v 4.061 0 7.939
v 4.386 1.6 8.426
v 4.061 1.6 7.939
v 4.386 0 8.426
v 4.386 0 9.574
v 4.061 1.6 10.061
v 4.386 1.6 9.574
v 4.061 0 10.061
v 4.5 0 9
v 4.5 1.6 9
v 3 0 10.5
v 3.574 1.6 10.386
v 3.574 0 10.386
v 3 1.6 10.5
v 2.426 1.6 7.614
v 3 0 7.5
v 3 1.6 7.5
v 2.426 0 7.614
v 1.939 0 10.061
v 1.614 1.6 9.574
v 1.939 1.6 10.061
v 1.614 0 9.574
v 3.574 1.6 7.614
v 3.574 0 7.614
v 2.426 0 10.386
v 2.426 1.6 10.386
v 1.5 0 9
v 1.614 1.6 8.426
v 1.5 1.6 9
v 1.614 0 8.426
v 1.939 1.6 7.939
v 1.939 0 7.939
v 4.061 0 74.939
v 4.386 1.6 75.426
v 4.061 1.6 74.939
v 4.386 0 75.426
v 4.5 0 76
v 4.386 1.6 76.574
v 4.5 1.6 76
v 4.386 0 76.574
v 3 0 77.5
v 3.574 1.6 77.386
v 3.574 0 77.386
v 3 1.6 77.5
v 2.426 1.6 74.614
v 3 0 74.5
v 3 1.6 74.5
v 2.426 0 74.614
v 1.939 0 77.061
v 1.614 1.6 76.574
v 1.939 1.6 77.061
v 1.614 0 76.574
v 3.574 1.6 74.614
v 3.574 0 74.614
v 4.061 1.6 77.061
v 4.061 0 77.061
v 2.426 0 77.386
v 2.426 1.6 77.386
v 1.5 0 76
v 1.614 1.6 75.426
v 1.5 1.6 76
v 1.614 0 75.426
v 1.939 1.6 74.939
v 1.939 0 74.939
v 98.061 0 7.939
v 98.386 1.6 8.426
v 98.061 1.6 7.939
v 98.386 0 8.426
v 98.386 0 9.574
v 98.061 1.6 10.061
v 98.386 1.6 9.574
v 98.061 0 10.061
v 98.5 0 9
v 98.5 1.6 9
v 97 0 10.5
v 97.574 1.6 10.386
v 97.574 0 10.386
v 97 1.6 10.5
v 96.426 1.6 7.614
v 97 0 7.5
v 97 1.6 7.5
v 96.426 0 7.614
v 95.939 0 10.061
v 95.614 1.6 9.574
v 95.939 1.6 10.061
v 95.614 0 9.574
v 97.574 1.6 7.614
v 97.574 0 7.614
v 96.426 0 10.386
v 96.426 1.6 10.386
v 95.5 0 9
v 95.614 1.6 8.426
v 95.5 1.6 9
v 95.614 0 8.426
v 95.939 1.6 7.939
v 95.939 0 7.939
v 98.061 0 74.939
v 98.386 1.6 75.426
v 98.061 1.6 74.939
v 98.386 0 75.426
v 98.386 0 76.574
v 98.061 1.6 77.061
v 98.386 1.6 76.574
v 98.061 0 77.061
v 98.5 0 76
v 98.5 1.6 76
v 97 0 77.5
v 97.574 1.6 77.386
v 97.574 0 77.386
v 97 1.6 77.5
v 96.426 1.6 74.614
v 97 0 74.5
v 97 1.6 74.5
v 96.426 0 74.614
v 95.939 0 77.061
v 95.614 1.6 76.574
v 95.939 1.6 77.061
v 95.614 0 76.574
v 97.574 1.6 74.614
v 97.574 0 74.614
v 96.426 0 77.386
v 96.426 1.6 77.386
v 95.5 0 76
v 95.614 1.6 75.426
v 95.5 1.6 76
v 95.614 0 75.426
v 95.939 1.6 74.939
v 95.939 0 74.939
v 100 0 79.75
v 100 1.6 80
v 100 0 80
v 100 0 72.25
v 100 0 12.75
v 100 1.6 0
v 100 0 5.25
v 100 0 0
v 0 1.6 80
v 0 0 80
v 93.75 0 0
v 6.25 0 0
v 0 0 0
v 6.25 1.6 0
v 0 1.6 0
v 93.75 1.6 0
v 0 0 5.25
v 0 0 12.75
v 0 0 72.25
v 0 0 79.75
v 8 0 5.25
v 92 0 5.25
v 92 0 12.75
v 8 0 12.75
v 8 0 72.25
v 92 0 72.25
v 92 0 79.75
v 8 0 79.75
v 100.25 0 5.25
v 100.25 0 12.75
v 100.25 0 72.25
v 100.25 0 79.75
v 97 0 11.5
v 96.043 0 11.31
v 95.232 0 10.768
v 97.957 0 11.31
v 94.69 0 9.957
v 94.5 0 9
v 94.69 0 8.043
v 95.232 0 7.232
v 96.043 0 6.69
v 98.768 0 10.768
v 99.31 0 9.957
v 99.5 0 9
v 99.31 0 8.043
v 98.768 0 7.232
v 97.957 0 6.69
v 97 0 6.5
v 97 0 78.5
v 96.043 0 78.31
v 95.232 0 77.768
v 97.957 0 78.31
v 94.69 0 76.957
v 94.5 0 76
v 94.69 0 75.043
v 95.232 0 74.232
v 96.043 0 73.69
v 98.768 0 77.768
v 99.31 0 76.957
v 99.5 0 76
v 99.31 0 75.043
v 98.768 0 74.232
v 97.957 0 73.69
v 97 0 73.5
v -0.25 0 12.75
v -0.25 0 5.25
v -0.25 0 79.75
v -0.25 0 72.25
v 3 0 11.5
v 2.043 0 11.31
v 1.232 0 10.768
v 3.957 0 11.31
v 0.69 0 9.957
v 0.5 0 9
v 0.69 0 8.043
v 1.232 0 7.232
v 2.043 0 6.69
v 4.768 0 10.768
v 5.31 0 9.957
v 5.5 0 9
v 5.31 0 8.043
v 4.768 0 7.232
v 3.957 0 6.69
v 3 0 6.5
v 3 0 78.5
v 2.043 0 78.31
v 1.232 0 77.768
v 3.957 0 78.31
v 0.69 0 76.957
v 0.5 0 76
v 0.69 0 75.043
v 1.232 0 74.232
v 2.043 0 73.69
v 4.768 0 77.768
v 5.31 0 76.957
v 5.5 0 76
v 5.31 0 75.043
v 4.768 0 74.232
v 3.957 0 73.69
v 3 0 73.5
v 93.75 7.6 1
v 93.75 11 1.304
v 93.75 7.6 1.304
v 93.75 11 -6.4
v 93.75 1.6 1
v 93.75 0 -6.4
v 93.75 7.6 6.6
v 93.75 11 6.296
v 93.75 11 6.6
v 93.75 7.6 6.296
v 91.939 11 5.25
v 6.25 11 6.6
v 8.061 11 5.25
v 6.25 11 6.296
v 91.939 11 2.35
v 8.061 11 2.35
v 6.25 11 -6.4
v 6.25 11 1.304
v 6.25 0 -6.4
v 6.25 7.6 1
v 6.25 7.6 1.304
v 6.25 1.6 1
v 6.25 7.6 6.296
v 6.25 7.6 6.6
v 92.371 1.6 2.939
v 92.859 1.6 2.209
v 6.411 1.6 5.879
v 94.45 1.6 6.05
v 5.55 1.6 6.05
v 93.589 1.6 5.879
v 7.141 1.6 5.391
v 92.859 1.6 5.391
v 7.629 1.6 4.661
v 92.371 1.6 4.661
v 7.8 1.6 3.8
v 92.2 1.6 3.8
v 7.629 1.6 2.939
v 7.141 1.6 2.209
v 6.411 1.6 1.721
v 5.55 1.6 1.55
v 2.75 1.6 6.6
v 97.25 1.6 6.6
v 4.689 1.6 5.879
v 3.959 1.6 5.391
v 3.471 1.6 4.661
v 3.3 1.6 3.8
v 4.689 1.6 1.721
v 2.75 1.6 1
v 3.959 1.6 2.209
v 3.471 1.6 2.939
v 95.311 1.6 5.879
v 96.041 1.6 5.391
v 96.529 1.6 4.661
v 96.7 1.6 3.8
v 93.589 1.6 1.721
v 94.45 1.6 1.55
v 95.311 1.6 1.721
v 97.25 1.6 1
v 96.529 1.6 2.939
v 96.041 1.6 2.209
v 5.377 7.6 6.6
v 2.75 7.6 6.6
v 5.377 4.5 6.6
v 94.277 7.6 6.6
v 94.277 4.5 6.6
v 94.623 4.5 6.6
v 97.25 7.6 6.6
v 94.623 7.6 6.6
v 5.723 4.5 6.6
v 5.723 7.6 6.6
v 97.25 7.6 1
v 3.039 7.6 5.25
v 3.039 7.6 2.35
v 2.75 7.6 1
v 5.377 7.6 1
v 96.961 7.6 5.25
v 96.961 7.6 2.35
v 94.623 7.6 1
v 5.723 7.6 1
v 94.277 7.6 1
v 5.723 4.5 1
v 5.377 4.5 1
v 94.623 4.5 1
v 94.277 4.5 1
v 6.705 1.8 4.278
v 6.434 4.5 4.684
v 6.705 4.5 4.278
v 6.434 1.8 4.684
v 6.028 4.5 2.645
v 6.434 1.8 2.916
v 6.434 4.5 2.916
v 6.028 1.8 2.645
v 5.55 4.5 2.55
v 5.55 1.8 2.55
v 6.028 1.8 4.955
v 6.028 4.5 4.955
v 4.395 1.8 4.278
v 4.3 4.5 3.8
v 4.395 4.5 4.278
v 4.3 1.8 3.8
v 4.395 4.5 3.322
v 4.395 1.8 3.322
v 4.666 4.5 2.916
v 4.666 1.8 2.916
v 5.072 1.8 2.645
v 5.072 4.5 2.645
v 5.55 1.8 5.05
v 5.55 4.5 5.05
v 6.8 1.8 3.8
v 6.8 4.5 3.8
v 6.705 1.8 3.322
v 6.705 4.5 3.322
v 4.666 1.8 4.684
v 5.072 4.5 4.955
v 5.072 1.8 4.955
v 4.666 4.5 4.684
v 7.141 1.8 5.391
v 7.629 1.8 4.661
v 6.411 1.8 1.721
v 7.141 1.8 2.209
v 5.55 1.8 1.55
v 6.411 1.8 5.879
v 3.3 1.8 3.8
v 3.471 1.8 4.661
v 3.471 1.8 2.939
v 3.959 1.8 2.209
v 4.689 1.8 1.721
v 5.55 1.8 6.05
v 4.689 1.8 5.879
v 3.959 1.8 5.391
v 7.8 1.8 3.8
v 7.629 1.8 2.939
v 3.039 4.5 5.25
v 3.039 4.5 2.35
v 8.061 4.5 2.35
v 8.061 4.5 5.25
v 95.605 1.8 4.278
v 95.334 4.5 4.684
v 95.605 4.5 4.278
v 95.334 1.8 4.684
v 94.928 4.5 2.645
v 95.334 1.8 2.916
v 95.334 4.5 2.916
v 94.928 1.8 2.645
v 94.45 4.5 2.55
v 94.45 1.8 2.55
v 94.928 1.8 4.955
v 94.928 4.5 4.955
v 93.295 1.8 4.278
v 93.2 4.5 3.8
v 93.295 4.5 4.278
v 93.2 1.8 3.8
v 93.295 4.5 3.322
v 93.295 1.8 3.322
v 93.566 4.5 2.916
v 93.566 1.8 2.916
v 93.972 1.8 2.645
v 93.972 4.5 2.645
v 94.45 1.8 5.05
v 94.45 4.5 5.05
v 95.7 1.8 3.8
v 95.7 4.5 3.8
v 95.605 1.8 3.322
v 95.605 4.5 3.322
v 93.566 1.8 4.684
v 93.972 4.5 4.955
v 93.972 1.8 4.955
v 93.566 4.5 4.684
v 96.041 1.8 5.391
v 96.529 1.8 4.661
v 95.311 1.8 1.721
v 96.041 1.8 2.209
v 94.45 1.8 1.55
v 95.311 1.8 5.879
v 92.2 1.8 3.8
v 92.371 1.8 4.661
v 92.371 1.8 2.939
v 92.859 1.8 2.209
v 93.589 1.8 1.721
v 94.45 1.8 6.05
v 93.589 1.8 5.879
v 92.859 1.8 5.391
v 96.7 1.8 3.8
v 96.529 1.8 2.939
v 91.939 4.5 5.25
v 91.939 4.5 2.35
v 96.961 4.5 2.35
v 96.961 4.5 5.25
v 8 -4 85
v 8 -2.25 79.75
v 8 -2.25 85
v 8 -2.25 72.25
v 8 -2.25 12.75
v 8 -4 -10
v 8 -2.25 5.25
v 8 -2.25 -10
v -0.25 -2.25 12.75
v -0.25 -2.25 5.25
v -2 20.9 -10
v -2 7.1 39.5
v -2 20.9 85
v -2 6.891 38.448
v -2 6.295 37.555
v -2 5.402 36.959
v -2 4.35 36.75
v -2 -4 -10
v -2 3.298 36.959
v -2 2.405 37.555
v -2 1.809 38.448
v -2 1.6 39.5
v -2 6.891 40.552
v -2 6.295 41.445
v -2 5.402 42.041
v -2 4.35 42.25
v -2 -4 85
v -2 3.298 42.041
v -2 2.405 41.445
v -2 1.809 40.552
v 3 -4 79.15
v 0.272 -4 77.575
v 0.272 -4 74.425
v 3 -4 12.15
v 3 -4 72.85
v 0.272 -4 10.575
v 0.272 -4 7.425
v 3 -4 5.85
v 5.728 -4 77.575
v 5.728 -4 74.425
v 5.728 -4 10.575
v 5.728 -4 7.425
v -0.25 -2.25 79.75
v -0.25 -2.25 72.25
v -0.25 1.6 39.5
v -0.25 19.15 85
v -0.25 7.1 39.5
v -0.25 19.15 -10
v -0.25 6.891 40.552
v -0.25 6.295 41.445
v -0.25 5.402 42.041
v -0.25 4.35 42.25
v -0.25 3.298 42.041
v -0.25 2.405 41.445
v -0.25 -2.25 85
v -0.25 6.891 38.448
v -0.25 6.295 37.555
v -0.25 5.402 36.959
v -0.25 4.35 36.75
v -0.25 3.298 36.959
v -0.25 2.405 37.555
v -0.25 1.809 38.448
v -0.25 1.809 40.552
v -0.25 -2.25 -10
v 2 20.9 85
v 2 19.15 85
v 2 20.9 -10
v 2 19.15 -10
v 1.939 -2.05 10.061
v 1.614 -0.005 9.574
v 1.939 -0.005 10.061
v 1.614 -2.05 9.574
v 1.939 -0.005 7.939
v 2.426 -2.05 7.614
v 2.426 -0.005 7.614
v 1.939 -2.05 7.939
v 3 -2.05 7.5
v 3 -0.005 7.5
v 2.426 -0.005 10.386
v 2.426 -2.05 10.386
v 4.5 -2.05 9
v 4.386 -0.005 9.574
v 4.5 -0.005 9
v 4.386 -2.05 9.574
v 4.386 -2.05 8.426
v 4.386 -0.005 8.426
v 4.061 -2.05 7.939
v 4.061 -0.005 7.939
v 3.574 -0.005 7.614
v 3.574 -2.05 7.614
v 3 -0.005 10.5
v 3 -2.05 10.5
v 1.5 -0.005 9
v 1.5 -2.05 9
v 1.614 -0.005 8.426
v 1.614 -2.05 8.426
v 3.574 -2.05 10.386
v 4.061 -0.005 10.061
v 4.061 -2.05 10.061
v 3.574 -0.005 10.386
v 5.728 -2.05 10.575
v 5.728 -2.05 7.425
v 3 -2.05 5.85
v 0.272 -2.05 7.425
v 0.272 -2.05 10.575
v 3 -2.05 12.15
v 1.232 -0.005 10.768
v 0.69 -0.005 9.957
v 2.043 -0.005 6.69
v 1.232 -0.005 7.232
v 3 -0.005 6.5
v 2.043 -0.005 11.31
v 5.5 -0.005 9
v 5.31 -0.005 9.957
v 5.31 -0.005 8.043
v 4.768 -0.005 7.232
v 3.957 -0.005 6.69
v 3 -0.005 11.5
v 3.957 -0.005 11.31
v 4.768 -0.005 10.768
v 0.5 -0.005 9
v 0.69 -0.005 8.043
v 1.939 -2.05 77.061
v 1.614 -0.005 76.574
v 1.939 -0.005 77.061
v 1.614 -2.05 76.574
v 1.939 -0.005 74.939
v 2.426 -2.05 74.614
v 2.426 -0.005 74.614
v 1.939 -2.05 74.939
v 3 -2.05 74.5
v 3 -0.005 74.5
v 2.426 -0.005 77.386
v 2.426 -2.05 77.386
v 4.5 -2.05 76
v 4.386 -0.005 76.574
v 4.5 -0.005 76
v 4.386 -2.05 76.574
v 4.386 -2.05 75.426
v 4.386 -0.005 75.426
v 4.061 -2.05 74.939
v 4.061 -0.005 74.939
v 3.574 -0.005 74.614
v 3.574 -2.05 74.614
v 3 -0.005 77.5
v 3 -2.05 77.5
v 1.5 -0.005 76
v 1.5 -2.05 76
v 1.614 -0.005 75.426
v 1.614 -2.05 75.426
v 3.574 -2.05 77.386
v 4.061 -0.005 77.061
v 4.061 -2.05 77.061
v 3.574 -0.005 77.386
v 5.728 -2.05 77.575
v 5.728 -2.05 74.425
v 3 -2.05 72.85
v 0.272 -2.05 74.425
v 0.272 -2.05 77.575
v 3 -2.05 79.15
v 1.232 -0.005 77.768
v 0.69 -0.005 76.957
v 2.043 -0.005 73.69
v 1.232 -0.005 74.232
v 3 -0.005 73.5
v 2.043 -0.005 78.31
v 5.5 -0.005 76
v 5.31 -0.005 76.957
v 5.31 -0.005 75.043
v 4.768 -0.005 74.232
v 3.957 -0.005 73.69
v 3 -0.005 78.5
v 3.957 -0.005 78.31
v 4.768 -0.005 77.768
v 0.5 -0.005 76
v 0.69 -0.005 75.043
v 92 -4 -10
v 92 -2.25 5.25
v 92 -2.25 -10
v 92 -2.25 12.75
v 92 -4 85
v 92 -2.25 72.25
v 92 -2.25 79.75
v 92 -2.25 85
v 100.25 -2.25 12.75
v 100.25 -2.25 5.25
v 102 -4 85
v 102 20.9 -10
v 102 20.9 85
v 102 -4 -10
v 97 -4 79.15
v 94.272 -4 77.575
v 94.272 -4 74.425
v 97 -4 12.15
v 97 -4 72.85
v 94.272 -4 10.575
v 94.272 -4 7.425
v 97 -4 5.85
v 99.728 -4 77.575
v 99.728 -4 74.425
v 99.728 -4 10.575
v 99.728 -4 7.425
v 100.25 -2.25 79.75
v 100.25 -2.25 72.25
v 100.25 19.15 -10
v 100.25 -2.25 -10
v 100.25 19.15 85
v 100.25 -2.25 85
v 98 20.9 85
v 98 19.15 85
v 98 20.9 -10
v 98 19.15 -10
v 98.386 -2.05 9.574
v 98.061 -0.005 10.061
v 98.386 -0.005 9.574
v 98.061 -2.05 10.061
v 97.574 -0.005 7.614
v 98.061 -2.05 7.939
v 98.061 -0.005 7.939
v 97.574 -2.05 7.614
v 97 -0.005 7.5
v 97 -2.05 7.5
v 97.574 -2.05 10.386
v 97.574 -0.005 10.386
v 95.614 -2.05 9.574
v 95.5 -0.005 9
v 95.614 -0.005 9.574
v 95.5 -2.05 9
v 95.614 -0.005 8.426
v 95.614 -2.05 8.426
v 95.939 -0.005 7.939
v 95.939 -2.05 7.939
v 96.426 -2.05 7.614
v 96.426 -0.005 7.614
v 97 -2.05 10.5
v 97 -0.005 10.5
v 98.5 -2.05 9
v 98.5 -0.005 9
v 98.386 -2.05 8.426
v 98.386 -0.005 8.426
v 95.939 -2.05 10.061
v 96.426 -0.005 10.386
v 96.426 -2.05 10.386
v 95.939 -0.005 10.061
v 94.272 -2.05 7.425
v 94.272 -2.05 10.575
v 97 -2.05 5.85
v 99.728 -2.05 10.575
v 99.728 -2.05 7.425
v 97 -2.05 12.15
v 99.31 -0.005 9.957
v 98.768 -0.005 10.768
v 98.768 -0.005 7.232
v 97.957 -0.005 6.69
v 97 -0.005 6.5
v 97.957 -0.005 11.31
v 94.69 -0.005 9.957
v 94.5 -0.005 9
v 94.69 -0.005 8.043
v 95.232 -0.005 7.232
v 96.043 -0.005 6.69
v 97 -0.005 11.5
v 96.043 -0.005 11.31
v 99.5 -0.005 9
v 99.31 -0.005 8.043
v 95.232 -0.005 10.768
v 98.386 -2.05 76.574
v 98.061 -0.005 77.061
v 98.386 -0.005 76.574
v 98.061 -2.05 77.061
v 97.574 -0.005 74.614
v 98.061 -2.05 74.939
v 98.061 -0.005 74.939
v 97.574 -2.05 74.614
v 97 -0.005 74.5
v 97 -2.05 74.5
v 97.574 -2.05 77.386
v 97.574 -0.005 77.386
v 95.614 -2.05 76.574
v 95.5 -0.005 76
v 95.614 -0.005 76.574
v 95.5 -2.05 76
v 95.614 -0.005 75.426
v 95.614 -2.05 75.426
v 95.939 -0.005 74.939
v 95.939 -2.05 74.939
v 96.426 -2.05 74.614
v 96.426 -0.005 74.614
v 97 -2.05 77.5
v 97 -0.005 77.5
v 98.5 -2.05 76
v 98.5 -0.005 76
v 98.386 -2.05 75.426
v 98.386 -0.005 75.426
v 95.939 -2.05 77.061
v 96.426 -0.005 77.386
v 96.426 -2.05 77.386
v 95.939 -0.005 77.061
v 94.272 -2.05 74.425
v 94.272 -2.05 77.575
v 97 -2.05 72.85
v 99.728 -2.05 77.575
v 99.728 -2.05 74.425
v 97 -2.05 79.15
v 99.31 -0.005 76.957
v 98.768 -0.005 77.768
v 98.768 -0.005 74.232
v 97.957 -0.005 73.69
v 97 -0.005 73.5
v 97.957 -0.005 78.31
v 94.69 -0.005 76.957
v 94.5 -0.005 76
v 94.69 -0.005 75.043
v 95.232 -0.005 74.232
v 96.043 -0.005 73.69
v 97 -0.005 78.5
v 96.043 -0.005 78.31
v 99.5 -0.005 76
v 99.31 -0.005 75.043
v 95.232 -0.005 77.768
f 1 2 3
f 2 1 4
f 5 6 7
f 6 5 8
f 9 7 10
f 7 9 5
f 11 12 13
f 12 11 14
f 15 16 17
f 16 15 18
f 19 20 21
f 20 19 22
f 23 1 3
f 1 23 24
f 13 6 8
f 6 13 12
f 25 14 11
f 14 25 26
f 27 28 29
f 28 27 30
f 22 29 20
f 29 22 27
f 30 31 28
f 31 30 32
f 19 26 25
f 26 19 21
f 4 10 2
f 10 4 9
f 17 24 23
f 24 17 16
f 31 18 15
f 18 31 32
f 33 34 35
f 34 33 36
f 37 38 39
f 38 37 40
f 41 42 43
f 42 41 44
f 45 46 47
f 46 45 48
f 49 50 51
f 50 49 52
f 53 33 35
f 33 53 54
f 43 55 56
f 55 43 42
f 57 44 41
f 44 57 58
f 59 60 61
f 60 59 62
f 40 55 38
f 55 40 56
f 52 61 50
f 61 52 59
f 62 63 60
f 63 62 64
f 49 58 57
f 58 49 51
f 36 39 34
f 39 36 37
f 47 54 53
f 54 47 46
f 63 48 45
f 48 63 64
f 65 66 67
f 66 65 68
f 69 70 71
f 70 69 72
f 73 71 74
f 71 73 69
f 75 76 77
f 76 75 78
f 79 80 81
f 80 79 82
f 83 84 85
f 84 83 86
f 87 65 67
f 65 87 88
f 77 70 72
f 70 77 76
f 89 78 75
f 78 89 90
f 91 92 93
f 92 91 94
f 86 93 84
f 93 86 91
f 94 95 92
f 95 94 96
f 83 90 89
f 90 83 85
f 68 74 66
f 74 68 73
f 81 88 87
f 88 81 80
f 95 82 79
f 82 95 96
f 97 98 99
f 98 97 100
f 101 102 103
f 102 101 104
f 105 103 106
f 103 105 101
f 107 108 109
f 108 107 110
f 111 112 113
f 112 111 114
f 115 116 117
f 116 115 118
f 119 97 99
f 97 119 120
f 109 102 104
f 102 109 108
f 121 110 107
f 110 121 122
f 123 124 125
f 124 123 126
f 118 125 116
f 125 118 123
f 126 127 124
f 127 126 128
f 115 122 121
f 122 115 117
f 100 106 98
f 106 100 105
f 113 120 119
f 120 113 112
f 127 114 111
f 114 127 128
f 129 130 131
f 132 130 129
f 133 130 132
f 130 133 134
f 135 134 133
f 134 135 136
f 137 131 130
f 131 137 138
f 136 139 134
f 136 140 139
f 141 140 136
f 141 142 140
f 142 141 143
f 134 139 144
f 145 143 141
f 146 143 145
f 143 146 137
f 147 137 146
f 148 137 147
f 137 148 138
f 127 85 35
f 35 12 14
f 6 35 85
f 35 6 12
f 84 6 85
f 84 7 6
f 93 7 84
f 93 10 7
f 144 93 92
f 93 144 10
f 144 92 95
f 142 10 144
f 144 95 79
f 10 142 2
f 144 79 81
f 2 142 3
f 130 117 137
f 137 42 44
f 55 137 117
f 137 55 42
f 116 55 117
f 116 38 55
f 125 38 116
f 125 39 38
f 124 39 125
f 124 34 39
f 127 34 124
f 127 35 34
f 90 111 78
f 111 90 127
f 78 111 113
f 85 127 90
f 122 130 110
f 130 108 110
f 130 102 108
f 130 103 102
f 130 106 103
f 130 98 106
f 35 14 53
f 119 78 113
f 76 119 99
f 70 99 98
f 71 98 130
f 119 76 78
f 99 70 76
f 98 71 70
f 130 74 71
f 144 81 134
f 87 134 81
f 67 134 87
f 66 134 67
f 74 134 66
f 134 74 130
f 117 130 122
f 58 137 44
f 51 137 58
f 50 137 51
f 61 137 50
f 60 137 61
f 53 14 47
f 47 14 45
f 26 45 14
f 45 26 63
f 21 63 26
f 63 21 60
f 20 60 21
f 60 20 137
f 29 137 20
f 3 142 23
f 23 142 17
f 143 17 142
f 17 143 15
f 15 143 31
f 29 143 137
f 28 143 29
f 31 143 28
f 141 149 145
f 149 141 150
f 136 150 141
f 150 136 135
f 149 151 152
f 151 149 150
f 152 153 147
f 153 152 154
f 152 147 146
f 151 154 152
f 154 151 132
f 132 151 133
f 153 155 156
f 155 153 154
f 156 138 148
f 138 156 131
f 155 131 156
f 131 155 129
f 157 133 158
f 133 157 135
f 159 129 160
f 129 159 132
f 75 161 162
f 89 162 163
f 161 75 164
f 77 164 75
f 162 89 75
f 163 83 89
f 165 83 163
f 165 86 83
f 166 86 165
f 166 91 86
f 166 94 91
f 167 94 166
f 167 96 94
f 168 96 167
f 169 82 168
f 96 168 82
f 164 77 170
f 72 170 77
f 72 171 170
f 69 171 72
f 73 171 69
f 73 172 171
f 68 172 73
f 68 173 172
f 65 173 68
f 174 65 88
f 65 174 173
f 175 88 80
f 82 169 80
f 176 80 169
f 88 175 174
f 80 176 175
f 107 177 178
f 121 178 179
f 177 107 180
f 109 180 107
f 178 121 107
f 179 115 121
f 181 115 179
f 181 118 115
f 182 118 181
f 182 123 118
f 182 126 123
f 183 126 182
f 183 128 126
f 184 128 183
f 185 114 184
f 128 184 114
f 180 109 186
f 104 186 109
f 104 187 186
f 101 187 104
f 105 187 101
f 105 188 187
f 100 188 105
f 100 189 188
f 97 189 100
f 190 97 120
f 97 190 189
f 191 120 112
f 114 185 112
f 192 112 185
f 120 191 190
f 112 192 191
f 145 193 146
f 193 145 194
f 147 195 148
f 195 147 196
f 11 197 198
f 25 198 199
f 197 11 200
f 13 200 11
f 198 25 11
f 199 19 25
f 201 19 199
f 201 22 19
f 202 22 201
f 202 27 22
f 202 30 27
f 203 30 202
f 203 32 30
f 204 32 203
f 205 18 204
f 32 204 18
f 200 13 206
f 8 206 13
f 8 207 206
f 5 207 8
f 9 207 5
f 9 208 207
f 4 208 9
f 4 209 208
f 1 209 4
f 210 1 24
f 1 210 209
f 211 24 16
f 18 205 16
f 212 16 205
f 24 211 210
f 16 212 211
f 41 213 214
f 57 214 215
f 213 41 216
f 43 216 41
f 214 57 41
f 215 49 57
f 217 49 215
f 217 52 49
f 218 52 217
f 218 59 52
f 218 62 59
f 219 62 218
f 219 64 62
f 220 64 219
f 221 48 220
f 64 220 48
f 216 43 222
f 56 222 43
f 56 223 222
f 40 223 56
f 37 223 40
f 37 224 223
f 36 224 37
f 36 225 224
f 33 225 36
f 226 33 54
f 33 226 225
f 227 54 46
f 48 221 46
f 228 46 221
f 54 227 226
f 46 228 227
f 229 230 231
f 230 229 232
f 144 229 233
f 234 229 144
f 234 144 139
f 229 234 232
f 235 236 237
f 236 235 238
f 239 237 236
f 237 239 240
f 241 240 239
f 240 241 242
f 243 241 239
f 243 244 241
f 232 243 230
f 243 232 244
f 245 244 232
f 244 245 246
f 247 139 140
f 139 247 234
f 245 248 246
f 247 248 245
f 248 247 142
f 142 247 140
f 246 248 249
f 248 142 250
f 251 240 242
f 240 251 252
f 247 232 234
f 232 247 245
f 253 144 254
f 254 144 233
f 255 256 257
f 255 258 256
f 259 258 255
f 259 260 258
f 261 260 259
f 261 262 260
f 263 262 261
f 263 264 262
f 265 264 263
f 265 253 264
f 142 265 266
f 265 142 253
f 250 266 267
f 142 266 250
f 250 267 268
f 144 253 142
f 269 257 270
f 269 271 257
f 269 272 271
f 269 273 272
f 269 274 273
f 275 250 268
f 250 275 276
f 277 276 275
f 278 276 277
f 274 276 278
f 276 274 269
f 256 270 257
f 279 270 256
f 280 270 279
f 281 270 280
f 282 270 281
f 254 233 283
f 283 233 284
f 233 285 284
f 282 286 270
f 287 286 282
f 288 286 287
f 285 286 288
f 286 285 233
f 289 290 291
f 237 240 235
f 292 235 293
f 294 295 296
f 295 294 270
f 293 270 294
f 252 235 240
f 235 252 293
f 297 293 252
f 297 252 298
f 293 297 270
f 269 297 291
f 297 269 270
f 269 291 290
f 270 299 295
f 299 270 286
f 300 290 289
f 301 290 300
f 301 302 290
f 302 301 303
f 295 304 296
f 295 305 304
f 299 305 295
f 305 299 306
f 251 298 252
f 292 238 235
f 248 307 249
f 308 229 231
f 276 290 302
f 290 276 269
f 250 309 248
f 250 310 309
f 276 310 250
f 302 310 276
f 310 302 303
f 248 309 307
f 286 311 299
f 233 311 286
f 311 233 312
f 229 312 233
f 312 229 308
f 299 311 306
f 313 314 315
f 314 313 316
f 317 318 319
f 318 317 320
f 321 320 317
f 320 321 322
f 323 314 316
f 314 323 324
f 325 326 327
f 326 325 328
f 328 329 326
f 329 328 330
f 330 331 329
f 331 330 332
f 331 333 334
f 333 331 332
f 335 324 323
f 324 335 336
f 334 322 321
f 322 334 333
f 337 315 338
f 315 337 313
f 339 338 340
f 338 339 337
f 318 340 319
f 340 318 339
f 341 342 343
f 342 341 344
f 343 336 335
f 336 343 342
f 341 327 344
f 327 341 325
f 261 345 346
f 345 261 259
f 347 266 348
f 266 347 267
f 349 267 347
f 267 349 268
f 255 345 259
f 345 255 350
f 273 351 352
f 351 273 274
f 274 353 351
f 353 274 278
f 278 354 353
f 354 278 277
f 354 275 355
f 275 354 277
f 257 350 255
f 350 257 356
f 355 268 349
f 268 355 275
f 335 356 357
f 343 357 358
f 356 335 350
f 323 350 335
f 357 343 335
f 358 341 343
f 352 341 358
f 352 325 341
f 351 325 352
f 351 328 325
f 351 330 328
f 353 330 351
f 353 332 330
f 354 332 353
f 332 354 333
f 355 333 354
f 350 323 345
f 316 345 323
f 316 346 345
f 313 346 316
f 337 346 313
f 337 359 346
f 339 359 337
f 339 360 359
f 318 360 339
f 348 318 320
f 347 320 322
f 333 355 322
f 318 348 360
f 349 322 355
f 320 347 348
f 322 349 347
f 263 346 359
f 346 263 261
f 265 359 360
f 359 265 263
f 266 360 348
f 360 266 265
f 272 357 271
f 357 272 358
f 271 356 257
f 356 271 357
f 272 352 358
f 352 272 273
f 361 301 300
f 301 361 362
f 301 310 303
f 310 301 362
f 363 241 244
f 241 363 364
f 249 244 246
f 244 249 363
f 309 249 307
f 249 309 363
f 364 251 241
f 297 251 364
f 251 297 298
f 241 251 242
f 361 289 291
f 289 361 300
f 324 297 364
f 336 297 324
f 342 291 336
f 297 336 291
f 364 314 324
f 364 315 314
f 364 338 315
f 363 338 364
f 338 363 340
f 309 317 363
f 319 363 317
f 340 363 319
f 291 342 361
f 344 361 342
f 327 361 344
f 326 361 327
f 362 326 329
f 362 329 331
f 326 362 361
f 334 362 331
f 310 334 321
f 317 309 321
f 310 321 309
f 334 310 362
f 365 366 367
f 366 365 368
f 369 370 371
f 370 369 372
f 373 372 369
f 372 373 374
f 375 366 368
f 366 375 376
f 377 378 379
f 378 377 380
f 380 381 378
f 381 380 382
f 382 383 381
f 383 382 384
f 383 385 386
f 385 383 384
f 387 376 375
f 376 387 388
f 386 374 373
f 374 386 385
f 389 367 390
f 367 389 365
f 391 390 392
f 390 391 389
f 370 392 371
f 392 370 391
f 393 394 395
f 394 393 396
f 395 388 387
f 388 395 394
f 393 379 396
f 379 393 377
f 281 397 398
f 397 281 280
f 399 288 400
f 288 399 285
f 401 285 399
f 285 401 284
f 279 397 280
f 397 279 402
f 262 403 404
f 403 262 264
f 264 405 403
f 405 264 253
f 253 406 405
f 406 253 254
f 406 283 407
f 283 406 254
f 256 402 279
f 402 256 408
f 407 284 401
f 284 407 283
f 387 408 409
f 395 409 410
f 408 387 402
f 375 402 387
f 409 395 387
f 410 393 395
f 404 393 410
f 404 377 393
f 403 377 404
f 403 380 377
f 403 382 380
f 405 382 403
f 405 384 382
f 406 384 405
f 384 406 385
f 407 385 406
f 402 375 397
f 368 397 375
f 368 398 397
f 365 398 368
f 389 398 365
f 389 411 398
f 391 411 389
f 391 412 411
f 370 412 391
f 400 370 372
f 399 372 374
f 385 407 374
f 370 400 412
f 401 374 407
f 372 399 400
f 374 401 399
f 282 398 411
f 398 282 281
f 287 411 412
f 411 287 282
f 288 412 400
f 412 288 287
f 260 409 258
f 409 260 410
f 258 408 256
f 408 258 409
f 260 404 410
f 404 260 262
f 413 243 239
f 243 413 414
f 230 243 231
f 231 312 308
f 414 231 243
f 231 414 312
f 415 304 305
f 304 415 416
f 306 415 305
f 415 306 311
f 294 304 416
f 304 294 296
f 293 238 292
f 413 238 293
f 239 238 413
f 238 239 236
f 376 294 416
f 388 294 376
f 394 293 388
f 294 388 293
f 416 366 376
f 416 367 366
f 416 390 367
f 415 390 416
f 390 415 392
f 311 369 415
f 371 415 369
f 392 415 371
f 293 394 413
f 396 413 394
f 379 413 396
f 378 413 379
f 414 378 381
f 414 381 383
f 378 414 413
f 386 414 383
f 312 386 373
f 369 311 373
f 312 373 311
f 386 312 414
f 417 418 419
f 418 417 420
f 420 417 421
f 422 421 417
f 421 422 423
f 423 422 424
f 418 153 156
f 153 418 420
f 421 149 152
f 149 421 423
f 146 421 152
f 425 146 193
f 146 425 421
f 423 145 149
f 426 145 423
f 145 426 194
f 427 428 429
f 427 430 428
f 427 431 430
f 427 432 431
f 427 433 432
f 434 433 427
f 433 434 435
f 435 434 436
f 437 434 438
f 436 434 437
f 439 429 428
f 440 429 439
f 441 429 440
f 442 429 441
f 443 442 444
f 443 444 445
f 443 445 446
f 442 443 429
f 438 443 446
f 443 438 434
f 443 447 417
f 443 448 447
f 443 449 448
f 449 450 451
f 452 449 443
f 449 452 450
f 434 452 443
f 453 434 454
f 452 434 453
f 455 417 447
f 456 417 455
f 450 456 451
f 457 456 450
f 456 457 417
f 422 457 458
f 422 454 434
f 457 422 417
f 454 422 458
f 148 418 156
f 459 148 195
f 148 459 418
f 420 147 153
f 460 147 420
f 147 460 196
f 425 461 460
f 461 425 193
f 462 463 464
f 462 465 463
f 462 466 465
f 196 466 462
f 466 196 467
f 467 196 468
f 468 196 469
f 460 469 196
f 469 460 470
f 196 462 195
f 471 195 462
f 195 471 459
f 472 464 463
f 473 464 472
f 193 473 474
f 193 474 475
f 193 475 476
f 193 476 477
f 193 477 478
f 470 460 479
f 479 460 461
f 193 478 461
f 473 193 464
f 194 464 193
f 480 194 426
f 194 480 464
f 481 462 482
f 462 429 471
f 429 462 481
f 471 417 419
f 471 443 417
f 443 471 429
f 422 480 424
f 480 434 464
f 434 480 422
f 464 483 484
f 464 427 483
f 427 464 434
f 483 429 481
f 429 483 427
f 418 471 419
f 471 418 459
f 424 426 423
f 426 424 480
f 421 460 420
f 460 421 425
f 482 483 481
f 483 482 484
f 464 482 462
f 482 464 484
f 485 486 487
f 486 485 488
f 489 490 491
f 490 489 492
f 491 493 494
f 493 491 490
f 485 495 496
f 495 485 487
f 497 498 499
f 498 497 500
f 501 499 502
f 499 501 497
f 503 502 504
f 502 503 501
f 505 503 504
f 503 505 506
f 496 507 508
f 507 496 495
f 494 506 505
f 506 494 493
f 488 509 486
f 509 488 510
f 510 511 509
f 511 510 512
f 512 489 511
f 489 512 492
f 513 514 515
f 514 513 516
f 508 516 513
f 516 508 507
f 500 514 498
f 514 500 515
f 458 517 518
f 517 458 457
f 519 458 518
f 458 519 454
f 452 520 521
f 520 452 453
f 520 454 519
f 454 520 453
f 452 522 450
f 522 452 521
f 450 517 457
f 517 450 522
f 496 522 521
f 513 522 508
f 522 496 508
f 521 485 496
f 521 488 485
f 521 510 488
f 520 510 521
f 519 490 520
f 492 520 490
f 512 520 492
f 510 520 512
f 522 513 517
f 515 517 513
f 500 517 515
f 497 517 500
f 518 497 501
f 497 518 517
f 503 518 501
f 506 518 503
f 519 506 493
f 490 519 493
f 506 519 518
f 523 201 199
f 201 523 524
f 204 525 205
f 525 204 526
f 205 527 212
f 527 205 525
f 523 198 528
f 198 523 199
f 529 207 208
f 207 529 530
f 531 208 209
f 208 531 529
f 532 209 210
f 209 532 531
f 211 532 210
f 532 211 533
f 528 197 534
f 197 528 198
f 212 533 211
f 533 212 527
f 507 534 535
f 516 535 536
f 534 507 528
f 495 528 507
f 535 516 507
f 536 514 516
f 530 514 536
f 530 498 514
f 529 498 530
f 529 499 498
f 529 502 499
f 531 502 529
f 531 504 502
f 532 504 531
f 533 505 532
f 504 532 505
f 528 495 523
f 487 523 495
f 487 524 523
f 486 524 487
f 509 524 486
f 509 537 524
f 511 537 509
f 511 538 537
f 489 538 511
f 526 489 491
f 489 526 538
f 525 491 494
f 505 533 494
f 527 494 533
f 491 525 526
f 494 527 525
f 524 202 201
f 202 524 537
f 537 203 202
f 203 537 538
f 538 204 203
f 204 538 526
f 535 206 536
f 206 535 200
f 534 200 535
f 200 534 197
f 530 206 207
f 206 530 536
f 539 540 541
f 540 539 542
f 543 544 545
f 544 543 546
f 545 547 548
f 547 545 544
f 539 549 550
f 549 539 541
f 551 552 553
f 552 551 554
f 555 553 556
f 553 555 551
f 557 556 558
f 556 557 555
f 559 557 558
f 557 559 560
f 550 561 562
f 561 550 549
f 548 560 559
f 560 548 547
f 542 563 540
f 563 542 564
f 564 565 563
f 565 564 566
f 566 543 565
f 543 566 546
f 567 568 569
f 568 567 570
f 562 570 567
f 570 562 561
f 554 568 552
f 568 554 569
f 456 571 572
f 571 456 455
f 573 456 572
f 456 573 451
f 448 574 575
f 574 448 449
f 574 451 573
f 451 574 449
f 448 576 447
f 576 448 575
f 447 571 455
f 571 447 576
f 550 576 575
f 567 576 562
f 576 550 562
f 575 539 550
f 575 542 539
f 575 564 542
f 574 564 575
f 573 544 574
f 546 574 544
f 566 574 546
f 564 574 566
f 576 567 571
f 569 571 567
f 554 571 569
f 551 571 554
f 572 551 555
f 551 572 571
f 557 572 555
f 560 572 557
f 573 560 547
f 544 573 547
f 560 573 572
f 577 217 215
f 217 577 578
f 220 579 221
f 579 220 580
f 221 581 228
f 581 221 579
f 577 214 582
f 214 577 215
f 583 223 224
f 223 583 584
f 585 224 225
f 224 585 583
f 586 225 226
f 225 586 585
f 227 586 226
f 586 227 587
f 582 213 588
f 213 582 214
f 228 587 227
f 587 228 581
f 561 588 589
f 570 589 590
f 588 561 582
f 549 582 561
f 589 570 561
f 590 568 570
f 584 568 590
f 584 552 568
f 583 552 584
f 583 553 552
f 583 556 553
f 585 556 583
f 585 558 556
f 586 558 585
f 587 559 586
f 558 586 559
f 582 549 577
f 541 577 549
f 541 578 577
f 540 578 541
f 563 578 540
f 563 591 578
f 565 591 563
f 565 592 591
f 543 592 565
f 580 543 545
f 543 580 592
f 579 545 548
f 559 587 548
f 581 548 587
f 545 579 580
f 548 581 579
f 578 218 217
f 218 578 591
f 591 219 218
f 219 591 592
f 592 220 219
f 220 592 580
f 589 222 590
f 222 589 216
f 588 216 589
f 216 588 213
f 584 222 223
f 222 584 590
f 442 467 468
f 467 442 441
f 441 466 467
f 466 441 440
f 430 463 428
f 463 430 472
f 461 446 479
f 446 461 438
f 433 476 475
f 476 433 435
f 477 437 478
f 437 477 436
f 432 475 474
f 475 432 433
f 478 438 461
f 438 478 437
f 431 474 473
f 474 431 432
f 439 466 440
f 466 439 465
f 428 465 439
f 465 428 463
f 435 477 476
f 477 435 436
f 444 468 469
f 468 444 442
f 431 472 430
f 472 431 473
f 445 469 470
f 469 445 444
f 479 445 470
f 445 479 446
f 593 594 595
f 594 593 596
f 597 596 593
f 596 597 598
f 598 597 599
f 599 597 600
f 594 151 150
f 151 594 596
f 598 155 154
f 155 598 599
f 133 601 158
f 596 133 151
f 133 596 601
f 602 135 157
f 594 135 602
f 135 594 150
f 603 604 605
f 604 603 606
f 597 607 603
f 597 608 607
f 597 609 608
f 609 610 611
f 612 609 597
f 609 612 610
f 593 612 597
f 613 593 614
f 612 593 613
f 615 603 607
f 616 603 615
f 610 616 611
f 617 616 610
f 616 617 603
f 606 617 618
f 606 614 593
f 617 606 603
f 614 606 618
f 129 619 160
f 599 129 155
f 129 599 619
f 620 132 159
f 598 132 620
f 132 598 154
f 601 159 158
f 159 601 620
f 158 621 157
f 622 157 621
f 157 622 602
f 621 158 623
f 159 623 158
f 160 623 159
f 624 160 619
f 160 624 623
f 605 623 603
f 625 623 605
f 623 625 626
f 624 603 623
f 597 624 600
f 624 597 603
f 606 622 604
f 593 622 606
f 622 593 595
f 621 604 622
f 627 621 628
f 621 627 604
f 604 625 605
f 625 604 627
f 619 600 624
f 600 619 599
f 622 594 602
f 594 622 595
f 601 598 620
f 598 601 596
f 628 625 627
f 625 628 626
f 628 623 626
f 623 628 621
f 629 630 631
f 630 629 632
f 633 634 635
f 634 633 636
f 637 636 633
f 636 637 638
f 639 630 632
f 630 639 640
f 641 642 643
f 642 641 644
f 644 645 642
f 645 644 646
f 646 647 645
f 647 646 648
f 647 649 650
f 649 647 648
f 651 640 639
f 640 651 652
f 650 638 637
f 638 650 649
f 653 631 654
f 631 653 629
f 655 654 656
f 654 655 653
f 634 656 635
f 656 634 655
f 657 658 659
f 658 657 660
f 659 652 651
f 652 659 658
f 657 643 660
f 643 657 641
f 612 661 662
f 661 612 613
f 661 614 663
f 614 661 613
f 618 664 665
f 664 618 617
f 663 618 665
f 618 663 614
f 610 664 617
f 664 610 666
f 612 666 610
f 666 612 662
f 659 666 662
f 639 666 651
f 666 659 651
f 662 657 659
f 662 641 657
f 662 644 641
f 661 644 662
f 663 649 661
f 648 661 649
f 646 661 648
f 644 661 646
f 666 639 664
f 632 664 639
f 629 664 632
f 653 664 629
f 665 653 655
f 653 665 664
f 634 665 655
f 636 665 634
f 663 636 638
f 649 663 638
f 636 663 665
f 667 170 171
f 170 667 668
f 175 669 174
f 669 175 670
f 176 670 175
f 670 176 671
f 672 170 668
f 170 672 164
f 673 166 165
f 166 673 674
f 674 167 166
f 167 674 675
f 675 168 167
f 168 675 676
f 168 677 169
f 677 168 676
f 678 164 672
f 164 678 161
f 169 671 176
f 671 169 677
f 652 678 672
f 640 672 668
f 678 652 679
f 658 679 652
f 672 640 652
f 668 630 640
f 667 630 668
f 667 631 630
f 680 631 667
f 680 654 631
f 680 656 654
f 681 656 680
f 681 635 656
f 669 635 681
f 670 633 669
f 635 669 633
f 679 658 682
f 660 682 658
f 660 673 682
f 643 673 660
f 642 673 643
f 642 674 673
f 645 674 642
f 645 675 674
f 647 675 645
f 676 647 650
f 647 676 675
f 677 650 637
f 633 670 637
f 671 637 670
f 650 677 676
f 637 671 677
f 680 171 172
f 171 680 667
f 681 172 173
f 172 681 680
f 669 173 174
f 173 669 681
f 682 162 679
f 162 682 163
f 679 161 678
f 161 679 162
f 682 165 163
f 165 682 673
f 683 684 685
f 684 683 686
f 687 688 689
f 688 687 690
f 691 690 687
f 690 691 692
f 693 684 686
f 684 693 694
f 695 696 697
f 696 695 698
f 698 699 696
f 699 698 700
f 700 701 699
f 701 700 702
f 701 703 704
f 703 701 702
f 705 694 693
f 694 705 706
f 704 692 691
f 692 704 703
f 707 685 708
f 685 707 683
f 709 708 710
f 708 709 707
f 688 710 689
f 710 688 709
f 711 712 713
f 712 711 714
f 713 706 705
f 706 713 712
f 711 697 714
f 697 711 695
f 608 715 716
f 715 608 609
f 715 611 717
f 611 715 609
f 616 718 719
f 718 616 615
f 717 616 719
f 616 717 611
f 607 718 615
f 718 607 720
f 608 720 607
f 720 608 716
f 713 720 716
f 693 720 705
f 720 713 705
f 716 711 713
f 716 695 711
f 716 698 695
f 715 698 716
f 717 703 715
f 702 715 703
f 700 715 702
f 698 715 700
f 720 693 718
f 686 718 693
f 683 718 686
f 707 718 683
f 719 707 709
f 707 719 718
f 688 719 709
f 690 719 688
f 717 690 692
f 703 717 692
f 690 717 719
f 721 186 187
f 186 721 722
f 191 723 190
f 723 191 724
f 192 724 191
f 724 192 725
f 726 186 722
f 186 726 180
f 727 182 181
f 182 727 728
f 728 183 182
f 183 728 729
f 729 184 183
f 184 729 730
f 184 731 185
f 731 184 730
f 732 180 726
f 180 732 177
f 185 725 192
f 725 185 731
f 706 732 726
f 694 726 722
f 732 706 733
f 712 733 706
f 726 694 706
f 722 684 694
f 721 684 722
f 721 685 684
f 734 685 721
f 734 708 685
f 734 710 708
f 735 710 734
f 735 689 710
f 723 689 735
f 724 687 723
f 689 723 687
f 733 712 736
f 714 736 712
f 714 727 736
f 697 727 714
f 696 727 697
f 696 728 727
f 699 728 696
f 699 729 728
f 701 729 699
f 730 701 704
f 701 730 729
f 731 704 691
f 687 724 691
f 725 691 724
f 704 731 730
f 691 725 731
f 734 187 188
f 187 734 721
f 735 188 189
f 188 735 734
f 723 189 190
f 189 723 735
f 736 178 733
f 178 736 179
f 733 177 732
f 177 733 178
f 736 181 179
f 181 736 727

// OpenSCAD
// file: ../library/din41612/din41612_male.scad
// din41612 male connector
// =======================

include <din41612_male_dim.scad>

use <../linurs/linurs_screw.scad>

module din41612_male(){ 
  // color("LightGrey")
  difference(){
    union(){
        translate([0,din41612_male_w1/2,din41612_male_h/2-din41612_male_h1])  
        cube([din41612_male_l1,
              din41612_male_w1,
              din41612_male_h],
             center=true);  
      translate([0,(din41612_male_w1-din41612_male_w)/2,(din41612_male_h-din41612_male_h1)/2]) 
        cube([din41612_male_l1,
              (din41612_male_w-din41612_male_w1),
              din41612_male_h-din41612_male_h1],
             center=true);  
      translate([0,din41612_male_w2/2+din41612_male_w1-din41612_male_w,din41612_male_h2/2])
        cube([din41612_male_l,
              din41612_male_w2,
              din41612_male_h2],
             center=true);  
    }
    for(i=[-1,1]){ // mounting holes
      translate([i*din41612_male_dl/2,
                 din41612_male_w1-din41612_male_w+din41612_male_w2/2, 
                 din41612_male_h1])
      rotate([180,0,90])screw_fix(
            w=din41612_male_h2, 
            d=M2_5, 
            type=head_cyl, 
            nut_sink=din41612_male_h,
            t=0);
    }
  }
}
din41612_male();  
// file: ../library/din41612/din41612_male_dim.scad
include <../linurs/linurs_screw_dim.scad>

// connector dimensions
din41612_male_l=94.5;    // lenght of the connector
din41612_male_l1=87.5;   // 
din41612_male_w=13;      // width of the connector
din41612_male_w1=6.4;    // 
din41612_male_w2=5.6;    // 
din41612_male_h=11;      // height of the connector
din41612_male_h1=1.6;    // 
din41612_male_h2=6;      // 

din41612_male_dl=88.9;   // distance between mounting holes
// file: ../library/din41612/din41612_female_dim.scad
include <../linurs/linurs_screw_dim.scad>

// connector dimensions
din41612_female_l=95;       // lenght of the connector
din41612_female_l1=85;      // lenght of the connector head
din41612_female_h=11.6;     // height of the connector
din41612_female_h1=5.2;     // height produced by the connector when pulgged in 
din41612_female_w=11;       // width of the connector
din41612_female_w1=8.5;     // width of the connector head

din41612_female_dl=90;      // distance between mounting holes
// file: ../pcb/pcb.scad
// pcb
// ===
// The pcb is the master object and has its 
// lower left corner solder side at the origin of the 
// coordinate system 

n=2;  // [1,2,3,4,5,6,7,8]
show_pcb="assemblies"; // [assemblies,assembly,pcb]

include <pcb_dim.scad>
include <../motherboard/motherboard_dim.scad>

use <../library/din41612/din41612_male.scad>

module pcb(){
  echo("pcb");  
  color("greenyellow")
  difference(){
    cube([pcb_l,pcb_h,pcb_w]); // pcb
    for(x=[-1,1]){ // mounting holes
      for(y=[pcb_wd1,pcb_wd1+pcb_wd]){
        translate([x*pcb_ld/2+pcb_l/2,0,y])
        rotate([90,0,0])
        cylinder(d=pcb_d,h=3*pcb_h,center=true,$fn=16);
      }
    }
  }
}

module pcb_assembly(){
  echo("pcb assembly");  
  pcb();  
  translate([pcb_l/2,pcb_h,0])  
  rotate([-90,0,0])din41612_male();  
}

module pcb_assemblies(n=1){
  echo("pcb assemblies"); 
  for(i=[0:n-1]){ // add the connectors
      echo(i);
      translate([0,step*i,0])
      pcb_assembly();
  }    
}    

if(show_pcb=="assemblies"){
  pcb_assemblies(n=n);
}

if(show_pcb=="assembly"){
  pcb_assembly();
}

if(show_pcb=="pcb"){
    // Move to center to create 2D drawings from top view 
    // with script OpenSCAD22d.py
    //
    rotate([90,0,180])
    //
    translate([-pcb_l/2,-pcb_h/2,-pcb_w/2])
    pcb();
}
// file: ../bracket/bracket.scad
// bracket
// =======
// A bracket of the elecbox module
// - type: 0 front bracket, 1 rear bracket
// - width 1..n in steps

// parameters for customizer
// bracket width
n=2; // [1,2,3,4,5,6,7,8]
// type
bracket="Front"; // [Front,Back]
// intermediate mounting holes
intermediate=false;  

include <../pcb/pcb_dim.scad>

include <../motherboard/motherboard_dim.scad>
include <../library/linurs/linurs_screw_dim.scad>
include <bracket_dim.scad>

use <../library/linurs/linurs_screw.scad>
    
module back_bracket(n=1, intermediate=false){
  mirror([1,0,0])       // mirror it if desired
  front_bracket(n=n, intermediate=intermediate); 
}
    
module front_bracket(n=1, intermediate=false){
  echo("bracket");  
  //color("White")
  intermediatestep=(intermediate)?step:0; 
  difference(){
    union(){
      translate([-bracket_h2/2-bracket_gap/2,
                 bracket_w(n)/2-bracket_w1,
                 bracket_l/2])  
      cube([bracket_h2,
            bracket_w(n),
            bracket_l],center=true); // create the bracket front
  
      translate([bracket_h/2-bracket_h2-bracket_gap/2,
                 bracket_t/2-bracket_w1,
                 bracket_l/2]) 
      cube([bracket_h,
            bracket_t,
            bracket_l],center=true); // U shape side of the screw
      
      translate([bracket_h1/2-bracket_h2-bracket_gap/2,
                 bracket_w(n)-bracket_w1-bracket_t/2,
                 bracket_l/2]) 
      cube([bracket_h1,
            bracket_t,
            bracket_l],center=true); // U shape where no screw  
      for(x=[1:n]){  // create the mounting hole cubes 
        for(z=[bracket_l1,
               bracket_l1+bracket_ld]){
          translate([ bracket_h/2-bracket_h2-bracket_gap/2,
                     -bracket_w1/2+(x-1)*intermediatestep,
                     z])
          cube([bracket_h,
                bracket_w1,
                bracket_l2],center=true);
        }
      }   
    }
    for(x=[1:n]){ // create the mounting hole 
      for(z=[bracket_l1,
             bracket_l1+bracket_ld]){
        translate([bracket_h3-bracket_h2-bracket_gap/2,
                  -bracket_w1/2+(x-1)*intermediatestep,
                   z])
        rotate([0,90,0])
        rotate([-90,0,0])
        screw_fix(w=bracket_w1,d=bracket_screw,type=head_no, t=bracket_screw_gap);
      }
    }
  }
}

if(bracket=="Front"){
  front_bracket(intermediate=intermediate,n=n);
}

if(bracket=="Back"){
  back_bracket(intermediate=intermediate,n=n);
}
// file: ../library/linurs/linurs_screw.scad
// Metric screws and nuts 
// urs@linurs.org 2019
// It is targeted for 3D printing applications. 
// To look realistic is not the goal (Example: Nuts do not have a hole)

include <linurs_screw_dim.scad>

d=0; //[0:M2_5,1:M3,2:M4,3:M5]
type=0;//[0:head_cyl,1:head_cnt,2:head_no,3:head_hex]
w=15; 
i=10;
nut_sink=0;
screw_sink=0; 
t=0.01;
fn=16;

/* [hex_bolt] */
show_hex_bolt=false;

/* [nut] */
show_nut=false;

/* [screw] */
show_screw=false;

/* [screw_fix] */
show_screw_fix=false;

/* [screw_cut] */
show_screw_cut=false;

/* [nut_cut] */
show_nut_cut=false;
wi=0; 
rot=false;

// functions used multiple times to position nuts and heads
function headh_cyl(d)=screw_cyl[d][1];  // height of cyl screw head
function headh_cnt(d)=screw_cyl[d][1];  // height of cnt screw head
function headh(d,type=head_cyl)=(type==head_cyl ? headh_cyl(d) : (type==head_cnt ? headh_cnt(d) : 0 )); // height of screw head 

function nuth(d)=screw_hex[d][2];   // height of hex nut

// head of a cylinder screw
module screw_head_cyl(d=M3, t=0)
{
  screwhd=screw_cyl[d][0]+t; // diameter of cylinder screw head
  cylinder(d=screwhd,h=headh(d=d, type=head_cyl), center=true,$fn=16); // screw head
}

// head of a countersunk screw
module screw_head_cnt(d=M3, t=0)
{
  screwd=screw_d[d]+t; 
  screwhd=screw_cnt[d][0]+t; // diameter of cylinder screw head
  cylinder(d1=screwd,d2=screwhd,h=headh(d=d,type=head_cnt), center=true,$fn=16); // screw head
}

// head of a hex screw
module screw_head_hex(d=M3, t=0)
{
    translate([0,0,-nuth(d)/2])nut(d=d, t=t);
}

// head of all screws
module screw_head(d=M3, type=head_cyl, t=0)
{ 
  if(type==head_cnt){
    screw_head_cnt(d=d, t=t);
  } else {
    if(type==head_cyl){
      screw_head_cyl(d=d, t=t);
    } else {
       if(type==head_hex){
           screw_head_hex(d=d, t=t); 
       } 
    }    
  }
}

// hex bolt 
module hex_bolt(d=M3, w=10, t=0)
{
  nutd=screw_hex[d][1]+t; // outer diameter of hex bolt
  cylinder(r=nutd/2,h=w+t, center=true,$fn=6); // nut
}

// nut 
module nut(d=M3, t=0)
{
  hex_bolt(d=d, w=nuth(d), t=t);    
}

// screw 
// w outer width of the screw = screw length + head 
module screw(w=10, d=M3, type=head_cyl, t=0){
  screwd=screw_d[d]+t;       // screw diameter
  cylinder(d=screwd, h=w, center=true,$fn=16); // screw thread length
  translate([0,0,w/2-headh(d=d,type=type)/2])
  screw_head(d=d,type=type, t=t);
}

// screw fix
// w outer width of the screw = screw length + head 
// sink additional material below to remove 
// raise additional material above to remove
module screw_fix(w=10, d=M3, type=head_cyl, screw_sink=0, nut_sink=0, t=0){
  screw(w=w, d=d, type=type, t=t);
  translate([0,0,-w/2+nuth(d)/2])
    nut(d=d,t=t);
  //additional material to be removed above the nut  
  translate([0,0,-(w+nut_sink)/2])hex_bolt(d=d,w=nut_sink+0.01,t=t);    
  //additional material to be removed above the screw head
  if(type==head_cnt){  
    translate([0,0,w/2+screw_sink])
    cylinder(d=screw_cnt[d][0]+t,h=screw_sink+0.01,center=true,$fn=16);
  }else{ 
    translate([0,0,(w+screw_sink)/2])
    cylinder(d=screw_cyl[d][0]+t,h=screw_sink+0.01,center=true,$fn=16);
  }     
}

// screw cut
// material to be extracted from object to slide in a counter sunk screw for fixation
// w height of the cut out
// i depth of the screw
module screw_cut(d=M3,w=20,i=10,t=0,fn=32){
    hsh=screw_cnt[d][1];
    ws=screw_cnt[d][0]+t;
    ds=screw_d[d]+t;
    
    translate([i/2,0,-(w-hsh)/2])
      cube([i,ws,hsh],center=true);
    
    translate([0,0,-(w-hsh)/2])
      cylinder(d=ws,h=hsh,center=true,$fn=32);
    
    translate([0,0,-(w-hsh)/2+hsh])
        cylinder(d2=ds, d1=ws, h=hsh,center=true,$fn=fn);
    
    cylinder(h=w, d=ds, center=true, $fn=fn);   
    
    translate([i/2,0,0]) 
        cube([i,ds,w],center=true);
    
    for(y=[-1,1]){
        translate([i/2,y*ds/2,-w/2+hsh])
            rotate([45,0,0])
            cube([i,sqrt(2)*(ws-ds)/2,sqrt(2)*(ws-ds)/2],center=true);
    }
}
//screw_cut();

// nut cut
// material to be extracted from object to slide in a nut for fixation
// w height of the cylinder
// i lenght of the inlet
module nut_cut(w=10, wi=0, d=M3, i=10, t=0, rot=false,type=head_cyl){ 
  r=(rot)?90:0;
  ds=(rot)?screw_hex[d][1]:screw_hex[d][0];
  rotate([0,0,r])nut(d,t);
  translate([i/2,0,0])
    cube([i,ds+t,nuth(d)+t],center=true);
  translate([0,0,-wi])
      if(type==head_cnt){    
          screw(w=w, d=d, type=type, t=t); 
        translate([0,0,w/2])
          cylinder(d=screw_cnt[d][0]+t,h=raise,center=true,$fn=16);
      }
      else{ 
          screw(w=w, d=d, type=type, t=t);   
  //      translate([0,0,0])
          //#cylinder(d=screw_cyl[d][0]+t,h=w,center=true,$fn=16);
      }       
}

if(show_hex_bolt==true){
   hex_bolt(d=d, w=w, t=t);
}

if(show_nut==true){
  nut(d=d, t=t);
}    

if(show_screw==true){
   screw(w=w, d=d, type=type, t=t);
}

if(show_screw_fix==true){
  screw_fix(w=w, d=d, type=type, nut_sink=nut_sink, screw_sink=screw_sink, t=t);
}

if(show_screw_cut==true){
  screw_cut(d=d,w=w,i=i,t=t,$fn=fn);
}    

if(show_nut_cut==true){
  nut_cut(w=w, wi=wi, d=d, i=i, t=t,rot=rot,type=type);
}  
// file: ../library/linurs/linurs_screw_dim.scad
// Metric screws and nuts 
// urs@linurs.org

// contains dimensions of linurs_screw and can be included in other 
// OpenScad files 

// Parameters in this file
// d screw diameter M2_5, M3, ... (enumeration with screw_d)
// t millimeters added to diameters 

// enumerations of metric threads
M2_5=0;
M3=1;
M4=2;
M5=3;

// enumerations screw head type
head_cyl=0; // cylinder
head_cnt=1; // countrsunk
head_no=2;  // no head at all
head_hex=3;  // no head at all

// screw diameters
screw_d=[
2.5, // M2.5
3.0, // M3
4.0, // M4
5.0  // M5
];

// sizes for hex nuts
screw_hex=[
//   s,   e,   h
 [ 5.0, 5.8, 1.7], // M2.5
 [ 5.5, 6.4, 2.0], // M3
 [ 7.0, 8.1, 2.8], // M4
 [ 8.0, 9.2, 3.5]  // M5
];

// sizes for cylinder screw heads
screw_cyl=[
//   d,   h
 [ 4.5, 1.6], // M2.5
 [ 5.5, 2.0], // M3
 [ 7.0, 2.6], // M4
 [ 8.5, 3.3]  // M5
];

// sizes for countersunk screw heads
screw_cnt=[
//   d,   h
 [ 4.7, 1.50], // M2.5
 [ 5.6, 1.65], // M3
 [ 7.4, 2.20], // M4
 [ 9.2, 2.50]  // M5
];
// file: ../motherboard/motherboard_dim.scad
include <../library/linurs/linurs_screw_dim.scad>
include <../library/din41612/din41612_female_dim.scad>
include <../library/din41612/din41612_male_dim.scad>
include <../pcb/pcb_dim.scad>
// motherboard pcb dimensions
motherboard_l=pcb_l;   // pcb width
motherboard_h=1.6;     // pcb thickness
step=25.4;             // distance between modules

function motherboard_w(n)=din41612_female_w+step*(n-1);

screw_motherboard_d=M2_5;
screw_motherboard_l=16;
motherboard_pass=0.5;// gap to fit screws 

motherboard_z_offset=-din41612_male_w1-din41612_female_h1-motherboard_h;
// file: ../bracket/bracket_dim.scad
// bracket

include <../pcb/pcb_dim.scad>
include <../motherboard/motherboard_dim.scad>
include <../library/linurs/linurs_screw_dim.scad>

bracket_screw=M2_5;   // hole for the screw

bracket_gap=0.5;      // gap between bracket to make sure it fits in the box
bracket_screw_gap=0.5;// gap to fit the screw

bracket_l=pcb_w+15;   // height of bracket
bracket_l1=19;        // hole l
bracket_l2=3*screw_d[bracket_screw];
bracket_ld=pcb_wd;    // hole distance

bracket_h=10;         // depth of the U shape at the side of the screw
bracket_h1=4;         // depth of the U shape at the side where no screw is 
bracket_h2=2-bracket_gap/2;   // thickness of bracket
bracket_h3=5;         // hole h

bracket_w1=4;         // height of the mounting hole cube
bracket_tn=2;         // thickness of bracket
bracket_t=bracket_tn-bracket_gap/2;  // thickness of bracket - gap

bracket_offset_z=-10;  // bracket offset in elecbox z axis

function bracket_w(n)=step*n-bracket_gap;
function bracket_w2(n)=step*n-2*bracket_tn;
// file: ../pcb/pcb_dim.scad
// The pcb is the master object of the project
// therefore no other include files from other objects
// are necessary

// pcb constants
pcb_l =100;  // lenght of the pcb
pcb_ld = 94; // hole distance 
pcb_w=80;    // height of the pcb
pcb_wd = 67; // hole distance
pcb_wd1 = 9; // hole to edge distance 
pcb_d=3;     // diameter of holes
pcb_h=1.6;   // thickness
// main file
// Dcf77 module
// ============

dcf77="assembly"; // [assembly,front,back,print_front,print_back,antenna]

include <../pcb/pcb_dim.scad>
include <../bracket/bracket_dim.scad>
include <../motherboard/motherboard_dim.scad>
include <../library/linurs/linurs_screw_dim.scad>

use <../library/linurs/linurs_screw.scad>
use <../bracket/bracket.scad>
use <../pcb/pcb.scad>

module dcf77_back(){  
 translate([0,0,bracket_offset_z])back_bracket(n=1);
}

module dcf77_front(){  
    dLED=5.5;
    zLED=39.5;
    
    difference(){
        translate([0,0,bracket_offset_z])front_bracket(n=1);
   
        translate([
          0,
          pcb_h+dLED/2,
          zLED])rotate([0,90,0])
        cylinder(d=dLED, h=bracket_h, center=true, $fn=16); 
    }
}

module dcf77_assembly(){
    pcb_assembly();
    dcf77_front();
    translate([pcb_l,0,0])dcf77_back();
}

module dcf77_antenna(){
    w=7.3;
    h=8.2;
    l=5;
    t=1;
    t2=5;
    translate([0,w/2+t+(l+t)/2,h/2+t-t2/2])difference(){
        cube([w+2*t,l+t,h+2*t],center=true);
        translate([0,t/2,0])cube([w,l*1.01,h],center=true);
    }
    difference(){
    cube([w+2*t,w+2*t,t2],center=true);
    rotate([0,180,0])screw_fix(w=t2*1.01, d=M3, type=head_no, t=1);
    }
}

if(dcf77=="assembly"){
  dcf77_assembly();
}

if(dcf77=="front"){
   dcf77_front();
}

if(dcf77=="back"){
   dcf77_back();
}

if(dcf77=="print_front"){
  rotate([0,-90,0])
    dcf77_front();
}

if(dcf77=="print_back"){
  rotate([0,90,0])dcf77_back();
}

if(dcf77=="antenna"){
  dcf77_antenna();
}
